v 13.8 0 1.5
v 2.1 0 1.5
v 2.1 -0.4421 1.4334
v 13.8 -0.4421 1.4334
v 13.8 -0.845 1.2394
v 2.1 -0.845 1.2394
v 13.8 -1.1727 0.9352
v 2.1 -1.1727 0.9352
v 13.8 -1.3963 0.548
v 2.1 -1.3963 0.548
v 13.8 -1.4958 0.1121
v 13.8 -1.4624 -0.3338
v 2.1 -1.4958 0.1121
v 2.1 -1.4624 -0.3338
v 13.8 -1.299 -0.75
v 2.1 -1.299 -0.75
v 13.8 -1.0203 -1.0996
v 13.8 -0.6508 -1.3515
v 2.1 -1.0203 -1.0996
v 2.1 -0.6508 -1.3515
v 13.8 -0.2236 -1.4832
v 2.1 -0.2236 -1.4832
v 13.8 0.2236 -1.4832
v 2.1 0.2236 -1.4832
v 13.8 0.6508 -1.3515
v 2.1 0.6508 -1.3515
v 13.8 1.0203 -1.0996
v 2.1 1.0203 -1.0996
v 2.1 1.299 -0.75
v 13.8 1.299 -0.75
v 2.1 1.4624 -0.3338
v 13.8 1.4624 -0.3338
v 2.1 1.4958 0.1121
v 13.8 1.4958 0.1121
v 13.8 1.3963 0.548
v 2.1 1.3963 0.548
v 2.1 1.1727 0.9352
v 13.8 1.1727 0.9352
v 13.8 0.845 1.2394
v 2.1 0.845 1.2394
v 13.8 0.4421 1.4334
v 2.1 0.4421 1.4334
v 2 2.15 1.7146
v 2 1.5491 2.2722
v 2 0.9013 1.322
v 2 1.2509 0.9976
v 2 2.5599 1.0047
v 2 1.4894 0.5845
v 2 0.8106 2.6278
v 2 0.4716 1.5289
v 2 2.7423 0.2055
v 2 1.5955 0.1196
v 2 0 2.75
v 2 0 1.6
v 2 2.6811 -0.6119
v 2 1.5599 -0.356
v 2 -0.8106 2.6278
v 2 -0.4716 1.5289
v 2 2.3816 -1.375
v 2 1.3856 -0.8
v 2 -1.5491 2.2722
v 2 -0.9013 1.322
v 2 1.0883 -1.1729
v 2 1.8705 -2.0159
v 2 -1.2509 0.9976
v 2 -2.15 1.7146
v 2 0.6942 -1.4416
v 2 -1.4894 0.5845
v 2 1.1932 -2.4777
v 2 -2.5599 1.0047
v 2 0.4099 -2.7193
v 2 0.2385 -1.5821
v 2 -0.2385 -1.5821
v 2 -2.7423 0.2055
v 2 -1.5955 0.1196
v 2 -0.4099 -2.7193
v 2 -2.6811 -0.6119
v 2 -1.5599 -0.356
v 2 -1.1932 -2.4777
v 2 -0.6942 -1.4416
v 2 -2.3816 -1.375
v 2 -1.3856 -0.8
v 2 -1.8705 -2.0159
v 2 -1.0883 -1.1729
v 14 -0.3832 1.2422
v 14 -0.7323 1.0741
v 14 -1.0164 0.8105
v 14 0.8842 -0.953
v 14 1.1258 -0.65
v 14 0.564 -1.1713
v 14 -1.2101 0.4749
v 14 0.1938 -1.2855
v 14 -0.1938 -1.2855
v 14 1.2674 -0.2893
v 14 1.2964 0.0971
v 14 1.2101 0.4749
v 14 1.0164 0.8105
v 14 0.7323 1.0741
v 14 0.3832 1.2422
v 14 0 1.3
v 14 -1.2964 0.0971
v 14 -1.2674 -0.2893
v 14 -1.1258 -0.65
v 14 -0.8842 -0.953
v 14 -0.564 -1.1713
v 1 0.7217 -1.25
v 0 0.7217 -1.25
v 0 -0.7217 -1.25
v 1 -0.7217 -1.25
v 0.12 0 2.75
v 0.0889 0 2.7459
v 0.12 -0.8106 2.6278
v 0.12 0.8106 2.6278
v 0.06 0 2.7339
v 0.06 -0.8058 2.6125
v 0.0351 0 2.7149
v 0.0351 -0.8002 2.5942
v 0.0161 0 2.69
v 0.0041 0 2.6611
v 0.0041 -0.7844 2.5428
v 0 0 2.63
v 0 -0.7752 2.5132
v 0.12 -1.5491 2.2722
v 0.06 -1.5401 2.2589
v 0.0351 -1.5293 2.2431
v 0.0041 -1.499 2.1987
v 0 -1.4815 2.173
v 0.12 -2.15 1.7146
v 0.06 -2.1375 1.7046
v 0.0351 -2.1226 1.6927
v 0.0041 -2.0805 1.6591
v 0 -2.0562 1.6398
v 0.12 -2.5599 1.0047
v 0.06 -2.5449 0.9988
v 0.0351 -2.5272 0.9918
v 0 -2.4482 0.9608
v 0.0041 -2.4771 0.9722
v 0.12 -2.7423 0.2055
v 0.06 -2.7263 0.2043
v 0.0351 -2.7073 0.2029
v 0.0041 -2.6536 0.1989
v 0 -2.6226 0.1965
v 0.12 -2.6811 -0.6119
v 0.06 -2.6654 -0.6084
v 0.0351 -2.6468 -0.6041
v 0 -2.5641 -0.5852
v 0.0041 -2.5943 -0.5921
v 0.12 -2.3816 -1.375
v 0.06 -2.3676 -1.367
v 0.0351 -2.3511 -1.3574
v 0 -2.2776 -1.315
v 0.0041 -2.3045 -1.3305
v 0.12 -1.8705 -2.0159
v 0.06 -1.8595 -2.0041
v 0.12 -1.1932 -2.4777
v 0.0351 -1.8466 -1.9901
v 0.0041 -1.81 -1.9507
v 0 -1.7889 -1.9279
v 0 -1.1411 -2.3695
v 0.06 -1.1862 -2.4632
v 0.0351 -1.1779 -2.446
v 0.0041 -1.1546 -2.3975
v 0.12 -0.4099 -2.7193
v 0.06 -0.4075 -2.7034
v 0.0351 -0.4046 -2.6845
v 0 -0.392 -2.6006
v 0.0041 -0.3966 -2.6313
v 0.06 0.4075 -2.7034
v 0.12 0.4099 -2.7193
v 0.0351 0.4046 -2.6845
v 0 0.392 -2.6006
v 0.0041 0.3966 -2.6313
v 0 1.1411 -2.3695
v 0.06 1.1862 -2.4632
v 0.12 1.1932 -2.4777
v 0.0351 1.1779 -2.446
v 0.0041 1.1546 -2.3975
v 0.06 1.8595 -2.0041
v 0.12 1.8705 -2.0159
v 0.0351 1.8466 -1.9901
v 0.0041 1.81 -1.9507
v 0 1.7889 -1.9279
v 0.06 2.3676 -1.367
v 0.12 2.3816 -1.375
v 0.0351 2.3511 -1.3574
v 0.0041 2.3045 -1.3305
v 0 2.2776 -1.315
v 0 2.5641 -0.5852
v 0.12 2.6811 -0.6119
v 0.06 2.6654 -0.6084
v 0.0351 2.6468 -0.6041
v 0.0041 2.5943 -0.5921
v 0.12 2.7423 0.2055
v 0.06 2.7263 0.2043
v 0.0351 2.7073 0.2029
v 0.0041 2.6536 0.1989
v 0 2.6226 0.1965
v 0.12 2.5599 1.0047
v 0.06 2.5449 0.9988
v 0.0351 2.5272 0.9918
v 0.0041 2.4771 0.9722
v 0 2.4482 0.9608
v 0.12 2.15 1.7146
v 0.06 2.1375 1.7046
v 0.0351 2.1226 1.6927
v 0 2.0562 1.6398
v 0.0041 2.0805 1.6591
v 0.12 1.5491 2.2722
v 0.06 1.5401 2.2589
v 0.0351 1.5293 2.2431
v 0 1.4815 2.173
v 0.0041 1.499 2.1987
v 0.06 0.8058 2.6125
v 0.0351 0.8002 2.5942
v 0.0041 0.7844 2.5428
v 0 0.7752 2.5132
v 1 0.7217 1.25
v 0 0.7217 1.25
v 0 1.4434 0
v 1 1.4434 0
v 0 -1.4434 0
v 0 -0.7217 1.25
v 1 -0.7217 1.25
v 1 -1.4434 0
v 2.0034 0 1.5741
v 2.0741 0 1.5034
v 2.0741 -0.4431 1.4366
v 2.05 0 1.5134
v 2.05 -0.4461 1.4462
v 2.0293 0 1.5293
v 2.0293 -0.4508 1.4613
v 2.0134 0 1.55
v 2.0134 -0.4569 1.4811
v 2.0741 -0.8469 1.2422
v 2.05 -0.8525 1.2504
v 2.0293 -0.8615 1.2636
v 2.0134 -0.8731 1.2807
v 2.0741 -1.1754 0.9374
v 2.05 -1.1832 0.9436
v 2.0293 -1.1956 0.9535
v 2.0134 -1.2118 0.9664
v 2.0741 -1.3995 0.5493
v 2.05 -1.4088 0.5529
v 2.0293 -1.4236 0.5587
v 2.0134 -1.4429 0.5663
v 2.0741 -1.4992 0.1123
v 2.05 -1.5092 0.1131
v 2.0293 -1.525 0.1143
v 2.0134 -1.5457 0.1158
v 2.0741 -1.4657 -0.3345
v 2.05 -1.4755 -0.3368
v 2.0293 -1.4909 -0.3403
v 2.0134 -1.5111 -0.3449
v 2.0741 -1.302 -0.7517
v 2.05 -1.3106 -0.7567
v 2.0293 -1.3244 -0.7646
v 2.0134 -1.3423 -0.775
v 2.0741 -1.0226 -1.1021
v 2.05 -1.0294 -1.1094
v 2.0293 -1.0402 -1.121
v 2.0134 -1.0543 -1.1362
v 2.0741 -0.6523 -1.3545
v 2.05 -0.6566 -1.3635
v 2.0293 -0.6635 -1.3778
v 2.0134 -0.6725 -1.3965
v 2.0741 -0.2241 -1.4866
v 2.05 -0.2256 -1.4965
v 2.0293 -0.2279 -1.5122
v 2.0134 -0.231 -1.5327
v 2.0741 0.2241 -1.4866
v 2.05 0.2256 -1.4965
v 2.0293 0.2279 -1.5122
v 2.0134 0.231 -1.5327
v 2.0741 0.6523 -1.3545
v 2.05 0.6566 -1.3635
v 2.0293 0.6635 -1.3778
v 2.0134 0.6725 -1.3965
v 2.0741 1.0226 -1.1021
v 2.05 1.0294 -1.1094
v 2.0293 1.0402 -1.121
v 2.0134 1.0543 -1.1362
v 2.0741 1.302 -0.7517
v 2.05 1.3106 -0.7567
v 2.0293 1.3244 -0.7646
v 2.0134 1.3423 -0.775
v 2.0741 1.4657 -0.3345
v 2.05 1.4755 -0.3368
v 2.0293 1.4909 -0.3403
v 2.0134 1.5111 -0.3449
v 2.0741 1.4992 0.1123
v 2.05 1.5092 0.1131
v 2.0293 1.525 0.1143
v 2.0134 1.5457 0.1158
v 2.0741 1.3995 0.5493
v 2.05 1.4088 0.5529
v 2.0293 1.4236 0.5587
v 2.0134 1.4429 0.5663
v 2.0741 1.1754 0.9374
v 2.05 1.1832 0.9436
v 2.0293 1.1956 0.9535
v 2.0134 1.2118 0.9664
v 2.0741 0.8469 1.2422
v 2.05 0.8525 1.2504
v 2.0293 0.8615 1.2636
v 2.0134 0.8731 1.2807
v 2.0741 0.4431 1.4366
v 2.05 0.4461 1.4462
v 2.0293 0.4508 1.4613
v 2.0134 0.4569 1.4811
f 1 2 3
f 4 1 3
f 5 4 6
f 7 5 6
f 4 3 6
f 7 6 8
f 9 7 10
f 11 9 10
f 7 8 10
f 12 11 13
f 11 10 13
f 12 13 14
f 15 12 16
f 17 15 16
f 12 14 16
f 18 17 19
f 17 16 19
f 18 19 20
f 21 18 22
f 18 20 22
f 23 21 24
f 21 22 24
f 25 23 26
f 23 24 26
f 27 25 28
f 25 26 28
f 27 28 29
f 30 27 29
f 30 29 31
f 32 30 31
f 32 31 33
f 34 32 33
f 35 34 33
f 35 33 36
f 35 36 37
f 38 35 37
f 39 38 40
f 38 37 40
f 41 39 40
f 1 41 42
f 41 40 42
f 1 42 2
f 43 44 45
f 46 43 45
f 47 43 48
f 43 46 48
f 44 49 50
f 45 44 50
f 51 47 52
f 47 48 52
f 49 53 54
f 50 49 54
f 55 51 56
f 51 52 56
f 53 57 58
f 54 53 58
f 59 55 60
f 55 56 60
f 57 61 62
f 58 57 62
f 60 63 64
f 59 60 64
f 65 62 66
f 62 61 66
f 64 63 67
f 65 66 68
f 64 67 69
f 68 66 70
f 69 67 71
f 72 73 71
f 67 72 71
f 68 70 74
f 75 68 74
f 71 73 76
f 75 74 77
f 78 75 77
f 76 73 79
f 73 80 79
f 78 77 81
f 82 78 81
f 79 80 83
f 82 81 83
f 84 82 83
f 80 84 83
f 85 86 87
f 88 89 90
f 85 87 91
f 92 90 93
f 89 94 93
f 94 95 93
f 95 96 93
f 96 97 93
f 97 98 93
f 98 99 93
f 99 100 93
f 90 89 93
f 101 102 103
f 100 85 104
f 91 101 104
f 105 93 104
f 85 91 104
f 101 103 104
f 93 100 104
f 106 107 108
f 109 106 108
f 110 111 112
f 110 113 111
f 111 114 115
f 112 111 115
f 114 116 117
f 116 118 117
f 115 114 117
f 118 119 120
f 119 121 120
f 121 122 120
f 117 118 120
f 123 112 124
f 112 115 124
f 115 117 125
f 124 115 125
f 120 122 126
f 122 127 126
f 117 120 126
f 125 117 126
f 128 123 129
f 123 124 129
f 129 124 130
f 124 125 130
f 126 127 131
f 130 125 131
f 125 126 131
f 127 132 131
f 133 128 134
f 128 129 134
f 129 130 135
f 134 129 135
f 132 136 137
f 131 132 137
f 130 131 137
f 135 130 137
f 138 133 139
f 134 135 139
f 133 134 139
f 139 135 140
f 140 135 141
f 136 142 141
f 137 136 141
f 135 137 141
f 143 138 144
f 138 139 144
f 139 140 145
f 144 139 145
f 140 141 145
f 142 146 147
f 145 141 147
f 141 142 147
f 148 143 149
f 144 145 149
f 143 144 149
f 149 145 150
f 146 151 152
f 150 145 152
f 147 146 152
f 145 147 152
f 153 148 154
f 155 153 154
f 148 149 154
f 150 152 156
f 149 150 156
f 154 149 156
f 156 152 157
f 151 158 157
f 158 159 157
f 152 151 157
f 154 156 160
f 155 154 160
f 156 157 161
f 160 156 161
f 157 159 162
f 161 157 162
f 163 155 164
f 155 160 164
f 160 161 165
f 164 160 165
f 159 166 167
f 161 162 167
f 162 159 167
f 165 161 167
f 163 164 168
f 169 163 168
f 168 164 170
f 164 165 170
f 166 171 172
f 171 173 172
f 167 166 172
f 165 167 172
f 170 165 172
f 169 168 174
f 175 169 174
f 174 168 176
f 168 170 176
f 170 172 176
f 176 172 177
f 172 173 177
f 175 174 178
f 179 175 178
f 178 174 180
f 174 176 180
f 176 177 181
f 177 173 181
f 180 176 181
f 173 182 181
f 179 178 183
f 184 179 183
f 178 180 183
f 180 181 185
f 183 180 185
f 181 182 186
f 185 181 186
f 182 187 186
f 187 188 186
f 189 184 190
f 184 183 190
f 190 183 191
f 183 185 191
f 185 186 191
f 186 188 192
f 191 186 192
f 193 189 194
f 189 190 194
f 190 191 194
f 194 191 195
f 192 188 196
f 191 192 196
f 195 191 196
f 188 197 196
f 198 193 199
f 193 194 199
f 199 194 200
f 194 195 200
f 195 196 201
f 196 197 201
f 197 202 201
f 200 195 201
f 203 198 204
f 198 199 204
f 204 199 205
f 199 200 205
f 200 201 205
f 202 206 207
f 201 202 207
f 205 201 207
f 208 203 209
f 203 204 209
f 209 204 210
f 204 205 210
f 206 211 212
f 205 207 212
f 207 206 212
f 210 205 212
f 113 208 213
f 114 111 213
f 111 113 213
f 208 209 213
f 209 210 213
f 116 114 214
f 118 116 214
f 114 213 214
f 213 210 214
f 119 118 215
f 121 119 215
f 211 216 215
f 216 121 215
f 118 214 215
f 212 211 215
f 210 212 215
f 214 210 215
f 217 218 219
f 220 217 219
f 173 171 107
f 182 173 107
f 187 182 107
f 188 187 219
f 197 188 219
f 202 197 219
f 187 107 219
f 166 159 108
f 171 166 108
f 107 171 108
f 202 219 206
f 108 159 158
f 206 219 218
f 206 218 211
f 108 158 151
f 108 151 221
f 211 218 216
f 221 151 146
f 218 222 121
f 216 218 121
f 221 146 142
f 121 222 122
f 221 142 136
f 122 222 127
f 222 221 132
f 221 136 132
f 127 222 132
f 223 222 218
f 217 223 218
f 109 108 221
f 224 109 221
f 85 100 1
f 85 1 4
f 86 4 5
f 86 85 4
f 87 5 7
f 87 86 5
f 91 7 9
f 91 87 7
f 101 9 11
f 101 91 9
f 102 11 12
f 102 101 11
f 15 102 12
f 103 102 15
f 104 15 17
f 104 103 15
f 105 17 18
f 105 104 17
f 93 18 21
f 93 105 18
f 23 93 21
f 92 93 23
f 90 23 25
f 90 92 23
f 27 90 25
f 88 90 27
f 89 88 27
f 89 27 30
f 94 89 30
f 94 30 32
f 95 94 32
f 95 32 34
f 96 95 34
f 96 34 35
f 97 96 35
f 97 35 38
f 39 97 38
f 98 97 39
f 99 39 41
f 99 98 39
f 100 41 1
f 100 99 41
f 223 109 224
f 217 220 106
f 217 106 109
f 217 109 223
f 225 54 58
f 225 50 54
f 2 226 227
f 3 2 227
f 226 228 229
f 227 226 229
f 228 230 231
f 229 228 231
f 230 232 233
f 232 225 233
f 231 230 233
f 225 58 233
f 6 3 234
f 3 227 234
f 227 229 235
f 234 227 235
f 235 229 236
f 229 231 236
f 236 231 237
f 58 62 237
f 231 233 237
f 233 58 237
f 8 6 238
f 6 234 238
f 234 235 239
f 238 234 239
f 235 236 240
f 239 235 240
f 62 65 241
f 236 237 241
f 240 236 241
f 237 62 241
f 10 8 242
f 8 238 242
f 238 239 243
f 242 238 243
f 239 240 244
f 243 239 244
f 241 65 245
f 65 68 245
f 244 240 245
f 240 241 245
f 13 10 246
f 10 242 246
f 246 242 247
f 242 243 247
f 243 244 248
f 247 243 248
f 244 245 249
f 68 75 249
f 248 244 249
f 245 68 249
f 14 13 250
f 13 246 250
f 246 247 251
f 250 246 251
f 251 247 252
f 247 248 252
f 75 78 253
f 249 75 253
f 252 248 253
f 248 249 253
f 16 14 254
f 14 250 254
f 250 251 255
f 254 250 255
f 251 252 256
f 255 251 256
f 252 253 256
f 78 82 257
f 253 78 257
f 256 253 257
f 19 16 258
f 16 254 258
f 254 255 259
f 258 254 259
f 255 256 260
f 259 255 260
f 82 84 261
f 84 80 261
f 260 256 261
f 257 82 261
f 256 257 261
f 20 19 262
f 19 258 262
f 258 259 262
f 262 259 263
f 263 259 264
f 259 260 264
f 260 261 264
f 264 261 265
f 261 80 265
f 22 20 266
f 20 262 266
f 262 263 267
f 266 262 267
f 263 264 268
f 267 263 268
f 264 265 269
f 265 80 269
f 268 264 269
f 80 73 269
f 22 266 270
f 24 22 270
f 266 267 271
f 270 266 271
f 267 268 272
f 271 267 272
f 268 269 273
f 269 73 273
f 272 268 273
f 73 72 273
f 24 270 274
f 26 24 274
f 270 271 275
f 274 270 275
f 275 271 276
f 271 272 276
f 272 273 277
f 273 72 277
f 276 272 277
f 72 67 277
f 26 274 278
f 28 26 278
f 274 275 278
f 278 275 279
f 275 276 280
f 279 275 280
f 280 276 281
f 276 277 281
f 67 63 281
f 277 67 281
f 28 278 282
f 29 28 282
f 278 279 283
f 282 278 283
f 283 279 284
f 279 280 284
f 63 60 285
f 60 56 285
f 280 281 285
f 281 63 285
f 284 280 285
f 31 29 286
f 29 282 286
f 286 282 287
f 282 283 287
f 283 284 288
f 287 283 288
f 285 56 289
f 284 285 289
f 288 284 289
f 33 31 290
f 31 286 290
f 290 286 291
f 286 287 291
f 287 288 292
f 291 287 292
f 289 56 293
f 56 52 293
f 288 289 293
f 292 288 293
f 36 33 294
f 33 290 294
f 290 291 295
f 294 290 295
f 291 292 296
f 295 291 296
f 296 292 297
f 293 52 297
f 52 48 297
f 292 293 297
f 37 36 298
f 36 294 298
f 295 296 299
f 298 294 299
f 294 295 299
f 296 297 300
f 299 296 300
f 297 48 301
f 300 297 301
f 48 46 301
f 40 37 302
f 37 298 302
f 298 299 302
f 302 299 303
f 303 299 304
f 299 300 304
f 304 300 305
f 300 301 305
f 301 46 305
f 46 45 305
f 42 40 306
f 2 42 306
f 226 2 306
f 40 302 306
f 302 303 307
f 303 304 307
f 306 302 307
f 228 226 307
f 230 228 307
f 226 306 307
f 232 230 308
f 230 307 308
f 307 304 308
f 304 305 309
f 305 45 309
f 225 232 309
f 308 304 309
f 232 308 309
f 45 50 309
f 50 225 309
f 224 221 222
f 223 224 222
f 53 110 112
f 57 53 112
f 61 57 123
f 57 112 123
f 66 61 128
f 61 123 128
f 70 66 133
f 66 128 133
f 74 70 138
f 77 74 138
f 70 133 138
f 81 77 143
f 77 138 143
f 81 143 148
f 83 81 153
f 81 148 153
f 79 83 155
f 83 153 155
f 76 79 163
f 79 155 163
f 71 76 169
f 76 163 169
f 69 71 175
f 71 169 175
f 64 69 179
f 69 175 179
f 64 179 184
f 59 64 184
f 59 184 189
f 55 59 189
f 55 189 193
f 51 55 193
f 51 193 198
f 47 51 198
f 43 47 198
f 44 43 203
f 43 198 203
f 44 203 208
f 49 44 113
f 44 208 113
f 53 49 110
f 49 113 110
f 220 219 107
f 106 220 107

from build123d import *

# Parameters (mm, degrees)
FILLET1_R      = 0.1
FILLET2_R      = 0.12
CHAMFER1_SIZE  = 0.2
EXTRUDE1_DEPTH = 1


with BuildPart() as part:
    # Sketch1 → Revolve1 (revolve)
    with BuildSketch(Plane.XY, mode=Mode.PRIVATE) as revolve1_sk:
        Polygon((2, 1.5), (2, 0), (4.279914881, 0), (14, 0), (14, 1.5), align=None)
        Polygon((0, 2.75), (0, 0), (2, 0), (2, 1.5), (2, 2.75), align=None)
    revolve(revolve1_sk.sketch.rotate(Axis((0, 0, 0), (1, 0, 0)), 90), axis=Axis((0, 0, 0), (1, 0, 0)))

    # Fillet1
    fillet1_edges = [part.edges().sort_by_distance(p)[0] for p in [
        (2, 0, -1.5),
    ]]
    fillet(fillet1_edges, radius=FILLET1_R)

    # Fillet2
    fillet2_edges = [part.edges().sort_by_distance(p)[0] for p in [
        (0, 0, -2.75),
    ]]
    fillet(fillet2_edges, radius=FILLET2_R)

    # Chamfer1
    chamfer1_edges = [part.edges().sort_by_distance(p)[0] for p in [
        (14, 0, -1.5),
    ]]
    chamfer(chamfer1_edges, length=CHAMFER1_SIZE)

    # Sketch2 → Extrude1 (cut)
    with BuildSketch(Plane.ZY):
        Polygon((0, 1.443375673), (-1.25, 0.721687836), (-1.25, -0.721687836), (0, -1.443375673), (1.25, -0.721687836), (1.25, 0.721687836), align=None)
    extrude(amount=-EXTRUDE1_DEPTH, mode=Mode.SUBTRACT)


solid = part.part
